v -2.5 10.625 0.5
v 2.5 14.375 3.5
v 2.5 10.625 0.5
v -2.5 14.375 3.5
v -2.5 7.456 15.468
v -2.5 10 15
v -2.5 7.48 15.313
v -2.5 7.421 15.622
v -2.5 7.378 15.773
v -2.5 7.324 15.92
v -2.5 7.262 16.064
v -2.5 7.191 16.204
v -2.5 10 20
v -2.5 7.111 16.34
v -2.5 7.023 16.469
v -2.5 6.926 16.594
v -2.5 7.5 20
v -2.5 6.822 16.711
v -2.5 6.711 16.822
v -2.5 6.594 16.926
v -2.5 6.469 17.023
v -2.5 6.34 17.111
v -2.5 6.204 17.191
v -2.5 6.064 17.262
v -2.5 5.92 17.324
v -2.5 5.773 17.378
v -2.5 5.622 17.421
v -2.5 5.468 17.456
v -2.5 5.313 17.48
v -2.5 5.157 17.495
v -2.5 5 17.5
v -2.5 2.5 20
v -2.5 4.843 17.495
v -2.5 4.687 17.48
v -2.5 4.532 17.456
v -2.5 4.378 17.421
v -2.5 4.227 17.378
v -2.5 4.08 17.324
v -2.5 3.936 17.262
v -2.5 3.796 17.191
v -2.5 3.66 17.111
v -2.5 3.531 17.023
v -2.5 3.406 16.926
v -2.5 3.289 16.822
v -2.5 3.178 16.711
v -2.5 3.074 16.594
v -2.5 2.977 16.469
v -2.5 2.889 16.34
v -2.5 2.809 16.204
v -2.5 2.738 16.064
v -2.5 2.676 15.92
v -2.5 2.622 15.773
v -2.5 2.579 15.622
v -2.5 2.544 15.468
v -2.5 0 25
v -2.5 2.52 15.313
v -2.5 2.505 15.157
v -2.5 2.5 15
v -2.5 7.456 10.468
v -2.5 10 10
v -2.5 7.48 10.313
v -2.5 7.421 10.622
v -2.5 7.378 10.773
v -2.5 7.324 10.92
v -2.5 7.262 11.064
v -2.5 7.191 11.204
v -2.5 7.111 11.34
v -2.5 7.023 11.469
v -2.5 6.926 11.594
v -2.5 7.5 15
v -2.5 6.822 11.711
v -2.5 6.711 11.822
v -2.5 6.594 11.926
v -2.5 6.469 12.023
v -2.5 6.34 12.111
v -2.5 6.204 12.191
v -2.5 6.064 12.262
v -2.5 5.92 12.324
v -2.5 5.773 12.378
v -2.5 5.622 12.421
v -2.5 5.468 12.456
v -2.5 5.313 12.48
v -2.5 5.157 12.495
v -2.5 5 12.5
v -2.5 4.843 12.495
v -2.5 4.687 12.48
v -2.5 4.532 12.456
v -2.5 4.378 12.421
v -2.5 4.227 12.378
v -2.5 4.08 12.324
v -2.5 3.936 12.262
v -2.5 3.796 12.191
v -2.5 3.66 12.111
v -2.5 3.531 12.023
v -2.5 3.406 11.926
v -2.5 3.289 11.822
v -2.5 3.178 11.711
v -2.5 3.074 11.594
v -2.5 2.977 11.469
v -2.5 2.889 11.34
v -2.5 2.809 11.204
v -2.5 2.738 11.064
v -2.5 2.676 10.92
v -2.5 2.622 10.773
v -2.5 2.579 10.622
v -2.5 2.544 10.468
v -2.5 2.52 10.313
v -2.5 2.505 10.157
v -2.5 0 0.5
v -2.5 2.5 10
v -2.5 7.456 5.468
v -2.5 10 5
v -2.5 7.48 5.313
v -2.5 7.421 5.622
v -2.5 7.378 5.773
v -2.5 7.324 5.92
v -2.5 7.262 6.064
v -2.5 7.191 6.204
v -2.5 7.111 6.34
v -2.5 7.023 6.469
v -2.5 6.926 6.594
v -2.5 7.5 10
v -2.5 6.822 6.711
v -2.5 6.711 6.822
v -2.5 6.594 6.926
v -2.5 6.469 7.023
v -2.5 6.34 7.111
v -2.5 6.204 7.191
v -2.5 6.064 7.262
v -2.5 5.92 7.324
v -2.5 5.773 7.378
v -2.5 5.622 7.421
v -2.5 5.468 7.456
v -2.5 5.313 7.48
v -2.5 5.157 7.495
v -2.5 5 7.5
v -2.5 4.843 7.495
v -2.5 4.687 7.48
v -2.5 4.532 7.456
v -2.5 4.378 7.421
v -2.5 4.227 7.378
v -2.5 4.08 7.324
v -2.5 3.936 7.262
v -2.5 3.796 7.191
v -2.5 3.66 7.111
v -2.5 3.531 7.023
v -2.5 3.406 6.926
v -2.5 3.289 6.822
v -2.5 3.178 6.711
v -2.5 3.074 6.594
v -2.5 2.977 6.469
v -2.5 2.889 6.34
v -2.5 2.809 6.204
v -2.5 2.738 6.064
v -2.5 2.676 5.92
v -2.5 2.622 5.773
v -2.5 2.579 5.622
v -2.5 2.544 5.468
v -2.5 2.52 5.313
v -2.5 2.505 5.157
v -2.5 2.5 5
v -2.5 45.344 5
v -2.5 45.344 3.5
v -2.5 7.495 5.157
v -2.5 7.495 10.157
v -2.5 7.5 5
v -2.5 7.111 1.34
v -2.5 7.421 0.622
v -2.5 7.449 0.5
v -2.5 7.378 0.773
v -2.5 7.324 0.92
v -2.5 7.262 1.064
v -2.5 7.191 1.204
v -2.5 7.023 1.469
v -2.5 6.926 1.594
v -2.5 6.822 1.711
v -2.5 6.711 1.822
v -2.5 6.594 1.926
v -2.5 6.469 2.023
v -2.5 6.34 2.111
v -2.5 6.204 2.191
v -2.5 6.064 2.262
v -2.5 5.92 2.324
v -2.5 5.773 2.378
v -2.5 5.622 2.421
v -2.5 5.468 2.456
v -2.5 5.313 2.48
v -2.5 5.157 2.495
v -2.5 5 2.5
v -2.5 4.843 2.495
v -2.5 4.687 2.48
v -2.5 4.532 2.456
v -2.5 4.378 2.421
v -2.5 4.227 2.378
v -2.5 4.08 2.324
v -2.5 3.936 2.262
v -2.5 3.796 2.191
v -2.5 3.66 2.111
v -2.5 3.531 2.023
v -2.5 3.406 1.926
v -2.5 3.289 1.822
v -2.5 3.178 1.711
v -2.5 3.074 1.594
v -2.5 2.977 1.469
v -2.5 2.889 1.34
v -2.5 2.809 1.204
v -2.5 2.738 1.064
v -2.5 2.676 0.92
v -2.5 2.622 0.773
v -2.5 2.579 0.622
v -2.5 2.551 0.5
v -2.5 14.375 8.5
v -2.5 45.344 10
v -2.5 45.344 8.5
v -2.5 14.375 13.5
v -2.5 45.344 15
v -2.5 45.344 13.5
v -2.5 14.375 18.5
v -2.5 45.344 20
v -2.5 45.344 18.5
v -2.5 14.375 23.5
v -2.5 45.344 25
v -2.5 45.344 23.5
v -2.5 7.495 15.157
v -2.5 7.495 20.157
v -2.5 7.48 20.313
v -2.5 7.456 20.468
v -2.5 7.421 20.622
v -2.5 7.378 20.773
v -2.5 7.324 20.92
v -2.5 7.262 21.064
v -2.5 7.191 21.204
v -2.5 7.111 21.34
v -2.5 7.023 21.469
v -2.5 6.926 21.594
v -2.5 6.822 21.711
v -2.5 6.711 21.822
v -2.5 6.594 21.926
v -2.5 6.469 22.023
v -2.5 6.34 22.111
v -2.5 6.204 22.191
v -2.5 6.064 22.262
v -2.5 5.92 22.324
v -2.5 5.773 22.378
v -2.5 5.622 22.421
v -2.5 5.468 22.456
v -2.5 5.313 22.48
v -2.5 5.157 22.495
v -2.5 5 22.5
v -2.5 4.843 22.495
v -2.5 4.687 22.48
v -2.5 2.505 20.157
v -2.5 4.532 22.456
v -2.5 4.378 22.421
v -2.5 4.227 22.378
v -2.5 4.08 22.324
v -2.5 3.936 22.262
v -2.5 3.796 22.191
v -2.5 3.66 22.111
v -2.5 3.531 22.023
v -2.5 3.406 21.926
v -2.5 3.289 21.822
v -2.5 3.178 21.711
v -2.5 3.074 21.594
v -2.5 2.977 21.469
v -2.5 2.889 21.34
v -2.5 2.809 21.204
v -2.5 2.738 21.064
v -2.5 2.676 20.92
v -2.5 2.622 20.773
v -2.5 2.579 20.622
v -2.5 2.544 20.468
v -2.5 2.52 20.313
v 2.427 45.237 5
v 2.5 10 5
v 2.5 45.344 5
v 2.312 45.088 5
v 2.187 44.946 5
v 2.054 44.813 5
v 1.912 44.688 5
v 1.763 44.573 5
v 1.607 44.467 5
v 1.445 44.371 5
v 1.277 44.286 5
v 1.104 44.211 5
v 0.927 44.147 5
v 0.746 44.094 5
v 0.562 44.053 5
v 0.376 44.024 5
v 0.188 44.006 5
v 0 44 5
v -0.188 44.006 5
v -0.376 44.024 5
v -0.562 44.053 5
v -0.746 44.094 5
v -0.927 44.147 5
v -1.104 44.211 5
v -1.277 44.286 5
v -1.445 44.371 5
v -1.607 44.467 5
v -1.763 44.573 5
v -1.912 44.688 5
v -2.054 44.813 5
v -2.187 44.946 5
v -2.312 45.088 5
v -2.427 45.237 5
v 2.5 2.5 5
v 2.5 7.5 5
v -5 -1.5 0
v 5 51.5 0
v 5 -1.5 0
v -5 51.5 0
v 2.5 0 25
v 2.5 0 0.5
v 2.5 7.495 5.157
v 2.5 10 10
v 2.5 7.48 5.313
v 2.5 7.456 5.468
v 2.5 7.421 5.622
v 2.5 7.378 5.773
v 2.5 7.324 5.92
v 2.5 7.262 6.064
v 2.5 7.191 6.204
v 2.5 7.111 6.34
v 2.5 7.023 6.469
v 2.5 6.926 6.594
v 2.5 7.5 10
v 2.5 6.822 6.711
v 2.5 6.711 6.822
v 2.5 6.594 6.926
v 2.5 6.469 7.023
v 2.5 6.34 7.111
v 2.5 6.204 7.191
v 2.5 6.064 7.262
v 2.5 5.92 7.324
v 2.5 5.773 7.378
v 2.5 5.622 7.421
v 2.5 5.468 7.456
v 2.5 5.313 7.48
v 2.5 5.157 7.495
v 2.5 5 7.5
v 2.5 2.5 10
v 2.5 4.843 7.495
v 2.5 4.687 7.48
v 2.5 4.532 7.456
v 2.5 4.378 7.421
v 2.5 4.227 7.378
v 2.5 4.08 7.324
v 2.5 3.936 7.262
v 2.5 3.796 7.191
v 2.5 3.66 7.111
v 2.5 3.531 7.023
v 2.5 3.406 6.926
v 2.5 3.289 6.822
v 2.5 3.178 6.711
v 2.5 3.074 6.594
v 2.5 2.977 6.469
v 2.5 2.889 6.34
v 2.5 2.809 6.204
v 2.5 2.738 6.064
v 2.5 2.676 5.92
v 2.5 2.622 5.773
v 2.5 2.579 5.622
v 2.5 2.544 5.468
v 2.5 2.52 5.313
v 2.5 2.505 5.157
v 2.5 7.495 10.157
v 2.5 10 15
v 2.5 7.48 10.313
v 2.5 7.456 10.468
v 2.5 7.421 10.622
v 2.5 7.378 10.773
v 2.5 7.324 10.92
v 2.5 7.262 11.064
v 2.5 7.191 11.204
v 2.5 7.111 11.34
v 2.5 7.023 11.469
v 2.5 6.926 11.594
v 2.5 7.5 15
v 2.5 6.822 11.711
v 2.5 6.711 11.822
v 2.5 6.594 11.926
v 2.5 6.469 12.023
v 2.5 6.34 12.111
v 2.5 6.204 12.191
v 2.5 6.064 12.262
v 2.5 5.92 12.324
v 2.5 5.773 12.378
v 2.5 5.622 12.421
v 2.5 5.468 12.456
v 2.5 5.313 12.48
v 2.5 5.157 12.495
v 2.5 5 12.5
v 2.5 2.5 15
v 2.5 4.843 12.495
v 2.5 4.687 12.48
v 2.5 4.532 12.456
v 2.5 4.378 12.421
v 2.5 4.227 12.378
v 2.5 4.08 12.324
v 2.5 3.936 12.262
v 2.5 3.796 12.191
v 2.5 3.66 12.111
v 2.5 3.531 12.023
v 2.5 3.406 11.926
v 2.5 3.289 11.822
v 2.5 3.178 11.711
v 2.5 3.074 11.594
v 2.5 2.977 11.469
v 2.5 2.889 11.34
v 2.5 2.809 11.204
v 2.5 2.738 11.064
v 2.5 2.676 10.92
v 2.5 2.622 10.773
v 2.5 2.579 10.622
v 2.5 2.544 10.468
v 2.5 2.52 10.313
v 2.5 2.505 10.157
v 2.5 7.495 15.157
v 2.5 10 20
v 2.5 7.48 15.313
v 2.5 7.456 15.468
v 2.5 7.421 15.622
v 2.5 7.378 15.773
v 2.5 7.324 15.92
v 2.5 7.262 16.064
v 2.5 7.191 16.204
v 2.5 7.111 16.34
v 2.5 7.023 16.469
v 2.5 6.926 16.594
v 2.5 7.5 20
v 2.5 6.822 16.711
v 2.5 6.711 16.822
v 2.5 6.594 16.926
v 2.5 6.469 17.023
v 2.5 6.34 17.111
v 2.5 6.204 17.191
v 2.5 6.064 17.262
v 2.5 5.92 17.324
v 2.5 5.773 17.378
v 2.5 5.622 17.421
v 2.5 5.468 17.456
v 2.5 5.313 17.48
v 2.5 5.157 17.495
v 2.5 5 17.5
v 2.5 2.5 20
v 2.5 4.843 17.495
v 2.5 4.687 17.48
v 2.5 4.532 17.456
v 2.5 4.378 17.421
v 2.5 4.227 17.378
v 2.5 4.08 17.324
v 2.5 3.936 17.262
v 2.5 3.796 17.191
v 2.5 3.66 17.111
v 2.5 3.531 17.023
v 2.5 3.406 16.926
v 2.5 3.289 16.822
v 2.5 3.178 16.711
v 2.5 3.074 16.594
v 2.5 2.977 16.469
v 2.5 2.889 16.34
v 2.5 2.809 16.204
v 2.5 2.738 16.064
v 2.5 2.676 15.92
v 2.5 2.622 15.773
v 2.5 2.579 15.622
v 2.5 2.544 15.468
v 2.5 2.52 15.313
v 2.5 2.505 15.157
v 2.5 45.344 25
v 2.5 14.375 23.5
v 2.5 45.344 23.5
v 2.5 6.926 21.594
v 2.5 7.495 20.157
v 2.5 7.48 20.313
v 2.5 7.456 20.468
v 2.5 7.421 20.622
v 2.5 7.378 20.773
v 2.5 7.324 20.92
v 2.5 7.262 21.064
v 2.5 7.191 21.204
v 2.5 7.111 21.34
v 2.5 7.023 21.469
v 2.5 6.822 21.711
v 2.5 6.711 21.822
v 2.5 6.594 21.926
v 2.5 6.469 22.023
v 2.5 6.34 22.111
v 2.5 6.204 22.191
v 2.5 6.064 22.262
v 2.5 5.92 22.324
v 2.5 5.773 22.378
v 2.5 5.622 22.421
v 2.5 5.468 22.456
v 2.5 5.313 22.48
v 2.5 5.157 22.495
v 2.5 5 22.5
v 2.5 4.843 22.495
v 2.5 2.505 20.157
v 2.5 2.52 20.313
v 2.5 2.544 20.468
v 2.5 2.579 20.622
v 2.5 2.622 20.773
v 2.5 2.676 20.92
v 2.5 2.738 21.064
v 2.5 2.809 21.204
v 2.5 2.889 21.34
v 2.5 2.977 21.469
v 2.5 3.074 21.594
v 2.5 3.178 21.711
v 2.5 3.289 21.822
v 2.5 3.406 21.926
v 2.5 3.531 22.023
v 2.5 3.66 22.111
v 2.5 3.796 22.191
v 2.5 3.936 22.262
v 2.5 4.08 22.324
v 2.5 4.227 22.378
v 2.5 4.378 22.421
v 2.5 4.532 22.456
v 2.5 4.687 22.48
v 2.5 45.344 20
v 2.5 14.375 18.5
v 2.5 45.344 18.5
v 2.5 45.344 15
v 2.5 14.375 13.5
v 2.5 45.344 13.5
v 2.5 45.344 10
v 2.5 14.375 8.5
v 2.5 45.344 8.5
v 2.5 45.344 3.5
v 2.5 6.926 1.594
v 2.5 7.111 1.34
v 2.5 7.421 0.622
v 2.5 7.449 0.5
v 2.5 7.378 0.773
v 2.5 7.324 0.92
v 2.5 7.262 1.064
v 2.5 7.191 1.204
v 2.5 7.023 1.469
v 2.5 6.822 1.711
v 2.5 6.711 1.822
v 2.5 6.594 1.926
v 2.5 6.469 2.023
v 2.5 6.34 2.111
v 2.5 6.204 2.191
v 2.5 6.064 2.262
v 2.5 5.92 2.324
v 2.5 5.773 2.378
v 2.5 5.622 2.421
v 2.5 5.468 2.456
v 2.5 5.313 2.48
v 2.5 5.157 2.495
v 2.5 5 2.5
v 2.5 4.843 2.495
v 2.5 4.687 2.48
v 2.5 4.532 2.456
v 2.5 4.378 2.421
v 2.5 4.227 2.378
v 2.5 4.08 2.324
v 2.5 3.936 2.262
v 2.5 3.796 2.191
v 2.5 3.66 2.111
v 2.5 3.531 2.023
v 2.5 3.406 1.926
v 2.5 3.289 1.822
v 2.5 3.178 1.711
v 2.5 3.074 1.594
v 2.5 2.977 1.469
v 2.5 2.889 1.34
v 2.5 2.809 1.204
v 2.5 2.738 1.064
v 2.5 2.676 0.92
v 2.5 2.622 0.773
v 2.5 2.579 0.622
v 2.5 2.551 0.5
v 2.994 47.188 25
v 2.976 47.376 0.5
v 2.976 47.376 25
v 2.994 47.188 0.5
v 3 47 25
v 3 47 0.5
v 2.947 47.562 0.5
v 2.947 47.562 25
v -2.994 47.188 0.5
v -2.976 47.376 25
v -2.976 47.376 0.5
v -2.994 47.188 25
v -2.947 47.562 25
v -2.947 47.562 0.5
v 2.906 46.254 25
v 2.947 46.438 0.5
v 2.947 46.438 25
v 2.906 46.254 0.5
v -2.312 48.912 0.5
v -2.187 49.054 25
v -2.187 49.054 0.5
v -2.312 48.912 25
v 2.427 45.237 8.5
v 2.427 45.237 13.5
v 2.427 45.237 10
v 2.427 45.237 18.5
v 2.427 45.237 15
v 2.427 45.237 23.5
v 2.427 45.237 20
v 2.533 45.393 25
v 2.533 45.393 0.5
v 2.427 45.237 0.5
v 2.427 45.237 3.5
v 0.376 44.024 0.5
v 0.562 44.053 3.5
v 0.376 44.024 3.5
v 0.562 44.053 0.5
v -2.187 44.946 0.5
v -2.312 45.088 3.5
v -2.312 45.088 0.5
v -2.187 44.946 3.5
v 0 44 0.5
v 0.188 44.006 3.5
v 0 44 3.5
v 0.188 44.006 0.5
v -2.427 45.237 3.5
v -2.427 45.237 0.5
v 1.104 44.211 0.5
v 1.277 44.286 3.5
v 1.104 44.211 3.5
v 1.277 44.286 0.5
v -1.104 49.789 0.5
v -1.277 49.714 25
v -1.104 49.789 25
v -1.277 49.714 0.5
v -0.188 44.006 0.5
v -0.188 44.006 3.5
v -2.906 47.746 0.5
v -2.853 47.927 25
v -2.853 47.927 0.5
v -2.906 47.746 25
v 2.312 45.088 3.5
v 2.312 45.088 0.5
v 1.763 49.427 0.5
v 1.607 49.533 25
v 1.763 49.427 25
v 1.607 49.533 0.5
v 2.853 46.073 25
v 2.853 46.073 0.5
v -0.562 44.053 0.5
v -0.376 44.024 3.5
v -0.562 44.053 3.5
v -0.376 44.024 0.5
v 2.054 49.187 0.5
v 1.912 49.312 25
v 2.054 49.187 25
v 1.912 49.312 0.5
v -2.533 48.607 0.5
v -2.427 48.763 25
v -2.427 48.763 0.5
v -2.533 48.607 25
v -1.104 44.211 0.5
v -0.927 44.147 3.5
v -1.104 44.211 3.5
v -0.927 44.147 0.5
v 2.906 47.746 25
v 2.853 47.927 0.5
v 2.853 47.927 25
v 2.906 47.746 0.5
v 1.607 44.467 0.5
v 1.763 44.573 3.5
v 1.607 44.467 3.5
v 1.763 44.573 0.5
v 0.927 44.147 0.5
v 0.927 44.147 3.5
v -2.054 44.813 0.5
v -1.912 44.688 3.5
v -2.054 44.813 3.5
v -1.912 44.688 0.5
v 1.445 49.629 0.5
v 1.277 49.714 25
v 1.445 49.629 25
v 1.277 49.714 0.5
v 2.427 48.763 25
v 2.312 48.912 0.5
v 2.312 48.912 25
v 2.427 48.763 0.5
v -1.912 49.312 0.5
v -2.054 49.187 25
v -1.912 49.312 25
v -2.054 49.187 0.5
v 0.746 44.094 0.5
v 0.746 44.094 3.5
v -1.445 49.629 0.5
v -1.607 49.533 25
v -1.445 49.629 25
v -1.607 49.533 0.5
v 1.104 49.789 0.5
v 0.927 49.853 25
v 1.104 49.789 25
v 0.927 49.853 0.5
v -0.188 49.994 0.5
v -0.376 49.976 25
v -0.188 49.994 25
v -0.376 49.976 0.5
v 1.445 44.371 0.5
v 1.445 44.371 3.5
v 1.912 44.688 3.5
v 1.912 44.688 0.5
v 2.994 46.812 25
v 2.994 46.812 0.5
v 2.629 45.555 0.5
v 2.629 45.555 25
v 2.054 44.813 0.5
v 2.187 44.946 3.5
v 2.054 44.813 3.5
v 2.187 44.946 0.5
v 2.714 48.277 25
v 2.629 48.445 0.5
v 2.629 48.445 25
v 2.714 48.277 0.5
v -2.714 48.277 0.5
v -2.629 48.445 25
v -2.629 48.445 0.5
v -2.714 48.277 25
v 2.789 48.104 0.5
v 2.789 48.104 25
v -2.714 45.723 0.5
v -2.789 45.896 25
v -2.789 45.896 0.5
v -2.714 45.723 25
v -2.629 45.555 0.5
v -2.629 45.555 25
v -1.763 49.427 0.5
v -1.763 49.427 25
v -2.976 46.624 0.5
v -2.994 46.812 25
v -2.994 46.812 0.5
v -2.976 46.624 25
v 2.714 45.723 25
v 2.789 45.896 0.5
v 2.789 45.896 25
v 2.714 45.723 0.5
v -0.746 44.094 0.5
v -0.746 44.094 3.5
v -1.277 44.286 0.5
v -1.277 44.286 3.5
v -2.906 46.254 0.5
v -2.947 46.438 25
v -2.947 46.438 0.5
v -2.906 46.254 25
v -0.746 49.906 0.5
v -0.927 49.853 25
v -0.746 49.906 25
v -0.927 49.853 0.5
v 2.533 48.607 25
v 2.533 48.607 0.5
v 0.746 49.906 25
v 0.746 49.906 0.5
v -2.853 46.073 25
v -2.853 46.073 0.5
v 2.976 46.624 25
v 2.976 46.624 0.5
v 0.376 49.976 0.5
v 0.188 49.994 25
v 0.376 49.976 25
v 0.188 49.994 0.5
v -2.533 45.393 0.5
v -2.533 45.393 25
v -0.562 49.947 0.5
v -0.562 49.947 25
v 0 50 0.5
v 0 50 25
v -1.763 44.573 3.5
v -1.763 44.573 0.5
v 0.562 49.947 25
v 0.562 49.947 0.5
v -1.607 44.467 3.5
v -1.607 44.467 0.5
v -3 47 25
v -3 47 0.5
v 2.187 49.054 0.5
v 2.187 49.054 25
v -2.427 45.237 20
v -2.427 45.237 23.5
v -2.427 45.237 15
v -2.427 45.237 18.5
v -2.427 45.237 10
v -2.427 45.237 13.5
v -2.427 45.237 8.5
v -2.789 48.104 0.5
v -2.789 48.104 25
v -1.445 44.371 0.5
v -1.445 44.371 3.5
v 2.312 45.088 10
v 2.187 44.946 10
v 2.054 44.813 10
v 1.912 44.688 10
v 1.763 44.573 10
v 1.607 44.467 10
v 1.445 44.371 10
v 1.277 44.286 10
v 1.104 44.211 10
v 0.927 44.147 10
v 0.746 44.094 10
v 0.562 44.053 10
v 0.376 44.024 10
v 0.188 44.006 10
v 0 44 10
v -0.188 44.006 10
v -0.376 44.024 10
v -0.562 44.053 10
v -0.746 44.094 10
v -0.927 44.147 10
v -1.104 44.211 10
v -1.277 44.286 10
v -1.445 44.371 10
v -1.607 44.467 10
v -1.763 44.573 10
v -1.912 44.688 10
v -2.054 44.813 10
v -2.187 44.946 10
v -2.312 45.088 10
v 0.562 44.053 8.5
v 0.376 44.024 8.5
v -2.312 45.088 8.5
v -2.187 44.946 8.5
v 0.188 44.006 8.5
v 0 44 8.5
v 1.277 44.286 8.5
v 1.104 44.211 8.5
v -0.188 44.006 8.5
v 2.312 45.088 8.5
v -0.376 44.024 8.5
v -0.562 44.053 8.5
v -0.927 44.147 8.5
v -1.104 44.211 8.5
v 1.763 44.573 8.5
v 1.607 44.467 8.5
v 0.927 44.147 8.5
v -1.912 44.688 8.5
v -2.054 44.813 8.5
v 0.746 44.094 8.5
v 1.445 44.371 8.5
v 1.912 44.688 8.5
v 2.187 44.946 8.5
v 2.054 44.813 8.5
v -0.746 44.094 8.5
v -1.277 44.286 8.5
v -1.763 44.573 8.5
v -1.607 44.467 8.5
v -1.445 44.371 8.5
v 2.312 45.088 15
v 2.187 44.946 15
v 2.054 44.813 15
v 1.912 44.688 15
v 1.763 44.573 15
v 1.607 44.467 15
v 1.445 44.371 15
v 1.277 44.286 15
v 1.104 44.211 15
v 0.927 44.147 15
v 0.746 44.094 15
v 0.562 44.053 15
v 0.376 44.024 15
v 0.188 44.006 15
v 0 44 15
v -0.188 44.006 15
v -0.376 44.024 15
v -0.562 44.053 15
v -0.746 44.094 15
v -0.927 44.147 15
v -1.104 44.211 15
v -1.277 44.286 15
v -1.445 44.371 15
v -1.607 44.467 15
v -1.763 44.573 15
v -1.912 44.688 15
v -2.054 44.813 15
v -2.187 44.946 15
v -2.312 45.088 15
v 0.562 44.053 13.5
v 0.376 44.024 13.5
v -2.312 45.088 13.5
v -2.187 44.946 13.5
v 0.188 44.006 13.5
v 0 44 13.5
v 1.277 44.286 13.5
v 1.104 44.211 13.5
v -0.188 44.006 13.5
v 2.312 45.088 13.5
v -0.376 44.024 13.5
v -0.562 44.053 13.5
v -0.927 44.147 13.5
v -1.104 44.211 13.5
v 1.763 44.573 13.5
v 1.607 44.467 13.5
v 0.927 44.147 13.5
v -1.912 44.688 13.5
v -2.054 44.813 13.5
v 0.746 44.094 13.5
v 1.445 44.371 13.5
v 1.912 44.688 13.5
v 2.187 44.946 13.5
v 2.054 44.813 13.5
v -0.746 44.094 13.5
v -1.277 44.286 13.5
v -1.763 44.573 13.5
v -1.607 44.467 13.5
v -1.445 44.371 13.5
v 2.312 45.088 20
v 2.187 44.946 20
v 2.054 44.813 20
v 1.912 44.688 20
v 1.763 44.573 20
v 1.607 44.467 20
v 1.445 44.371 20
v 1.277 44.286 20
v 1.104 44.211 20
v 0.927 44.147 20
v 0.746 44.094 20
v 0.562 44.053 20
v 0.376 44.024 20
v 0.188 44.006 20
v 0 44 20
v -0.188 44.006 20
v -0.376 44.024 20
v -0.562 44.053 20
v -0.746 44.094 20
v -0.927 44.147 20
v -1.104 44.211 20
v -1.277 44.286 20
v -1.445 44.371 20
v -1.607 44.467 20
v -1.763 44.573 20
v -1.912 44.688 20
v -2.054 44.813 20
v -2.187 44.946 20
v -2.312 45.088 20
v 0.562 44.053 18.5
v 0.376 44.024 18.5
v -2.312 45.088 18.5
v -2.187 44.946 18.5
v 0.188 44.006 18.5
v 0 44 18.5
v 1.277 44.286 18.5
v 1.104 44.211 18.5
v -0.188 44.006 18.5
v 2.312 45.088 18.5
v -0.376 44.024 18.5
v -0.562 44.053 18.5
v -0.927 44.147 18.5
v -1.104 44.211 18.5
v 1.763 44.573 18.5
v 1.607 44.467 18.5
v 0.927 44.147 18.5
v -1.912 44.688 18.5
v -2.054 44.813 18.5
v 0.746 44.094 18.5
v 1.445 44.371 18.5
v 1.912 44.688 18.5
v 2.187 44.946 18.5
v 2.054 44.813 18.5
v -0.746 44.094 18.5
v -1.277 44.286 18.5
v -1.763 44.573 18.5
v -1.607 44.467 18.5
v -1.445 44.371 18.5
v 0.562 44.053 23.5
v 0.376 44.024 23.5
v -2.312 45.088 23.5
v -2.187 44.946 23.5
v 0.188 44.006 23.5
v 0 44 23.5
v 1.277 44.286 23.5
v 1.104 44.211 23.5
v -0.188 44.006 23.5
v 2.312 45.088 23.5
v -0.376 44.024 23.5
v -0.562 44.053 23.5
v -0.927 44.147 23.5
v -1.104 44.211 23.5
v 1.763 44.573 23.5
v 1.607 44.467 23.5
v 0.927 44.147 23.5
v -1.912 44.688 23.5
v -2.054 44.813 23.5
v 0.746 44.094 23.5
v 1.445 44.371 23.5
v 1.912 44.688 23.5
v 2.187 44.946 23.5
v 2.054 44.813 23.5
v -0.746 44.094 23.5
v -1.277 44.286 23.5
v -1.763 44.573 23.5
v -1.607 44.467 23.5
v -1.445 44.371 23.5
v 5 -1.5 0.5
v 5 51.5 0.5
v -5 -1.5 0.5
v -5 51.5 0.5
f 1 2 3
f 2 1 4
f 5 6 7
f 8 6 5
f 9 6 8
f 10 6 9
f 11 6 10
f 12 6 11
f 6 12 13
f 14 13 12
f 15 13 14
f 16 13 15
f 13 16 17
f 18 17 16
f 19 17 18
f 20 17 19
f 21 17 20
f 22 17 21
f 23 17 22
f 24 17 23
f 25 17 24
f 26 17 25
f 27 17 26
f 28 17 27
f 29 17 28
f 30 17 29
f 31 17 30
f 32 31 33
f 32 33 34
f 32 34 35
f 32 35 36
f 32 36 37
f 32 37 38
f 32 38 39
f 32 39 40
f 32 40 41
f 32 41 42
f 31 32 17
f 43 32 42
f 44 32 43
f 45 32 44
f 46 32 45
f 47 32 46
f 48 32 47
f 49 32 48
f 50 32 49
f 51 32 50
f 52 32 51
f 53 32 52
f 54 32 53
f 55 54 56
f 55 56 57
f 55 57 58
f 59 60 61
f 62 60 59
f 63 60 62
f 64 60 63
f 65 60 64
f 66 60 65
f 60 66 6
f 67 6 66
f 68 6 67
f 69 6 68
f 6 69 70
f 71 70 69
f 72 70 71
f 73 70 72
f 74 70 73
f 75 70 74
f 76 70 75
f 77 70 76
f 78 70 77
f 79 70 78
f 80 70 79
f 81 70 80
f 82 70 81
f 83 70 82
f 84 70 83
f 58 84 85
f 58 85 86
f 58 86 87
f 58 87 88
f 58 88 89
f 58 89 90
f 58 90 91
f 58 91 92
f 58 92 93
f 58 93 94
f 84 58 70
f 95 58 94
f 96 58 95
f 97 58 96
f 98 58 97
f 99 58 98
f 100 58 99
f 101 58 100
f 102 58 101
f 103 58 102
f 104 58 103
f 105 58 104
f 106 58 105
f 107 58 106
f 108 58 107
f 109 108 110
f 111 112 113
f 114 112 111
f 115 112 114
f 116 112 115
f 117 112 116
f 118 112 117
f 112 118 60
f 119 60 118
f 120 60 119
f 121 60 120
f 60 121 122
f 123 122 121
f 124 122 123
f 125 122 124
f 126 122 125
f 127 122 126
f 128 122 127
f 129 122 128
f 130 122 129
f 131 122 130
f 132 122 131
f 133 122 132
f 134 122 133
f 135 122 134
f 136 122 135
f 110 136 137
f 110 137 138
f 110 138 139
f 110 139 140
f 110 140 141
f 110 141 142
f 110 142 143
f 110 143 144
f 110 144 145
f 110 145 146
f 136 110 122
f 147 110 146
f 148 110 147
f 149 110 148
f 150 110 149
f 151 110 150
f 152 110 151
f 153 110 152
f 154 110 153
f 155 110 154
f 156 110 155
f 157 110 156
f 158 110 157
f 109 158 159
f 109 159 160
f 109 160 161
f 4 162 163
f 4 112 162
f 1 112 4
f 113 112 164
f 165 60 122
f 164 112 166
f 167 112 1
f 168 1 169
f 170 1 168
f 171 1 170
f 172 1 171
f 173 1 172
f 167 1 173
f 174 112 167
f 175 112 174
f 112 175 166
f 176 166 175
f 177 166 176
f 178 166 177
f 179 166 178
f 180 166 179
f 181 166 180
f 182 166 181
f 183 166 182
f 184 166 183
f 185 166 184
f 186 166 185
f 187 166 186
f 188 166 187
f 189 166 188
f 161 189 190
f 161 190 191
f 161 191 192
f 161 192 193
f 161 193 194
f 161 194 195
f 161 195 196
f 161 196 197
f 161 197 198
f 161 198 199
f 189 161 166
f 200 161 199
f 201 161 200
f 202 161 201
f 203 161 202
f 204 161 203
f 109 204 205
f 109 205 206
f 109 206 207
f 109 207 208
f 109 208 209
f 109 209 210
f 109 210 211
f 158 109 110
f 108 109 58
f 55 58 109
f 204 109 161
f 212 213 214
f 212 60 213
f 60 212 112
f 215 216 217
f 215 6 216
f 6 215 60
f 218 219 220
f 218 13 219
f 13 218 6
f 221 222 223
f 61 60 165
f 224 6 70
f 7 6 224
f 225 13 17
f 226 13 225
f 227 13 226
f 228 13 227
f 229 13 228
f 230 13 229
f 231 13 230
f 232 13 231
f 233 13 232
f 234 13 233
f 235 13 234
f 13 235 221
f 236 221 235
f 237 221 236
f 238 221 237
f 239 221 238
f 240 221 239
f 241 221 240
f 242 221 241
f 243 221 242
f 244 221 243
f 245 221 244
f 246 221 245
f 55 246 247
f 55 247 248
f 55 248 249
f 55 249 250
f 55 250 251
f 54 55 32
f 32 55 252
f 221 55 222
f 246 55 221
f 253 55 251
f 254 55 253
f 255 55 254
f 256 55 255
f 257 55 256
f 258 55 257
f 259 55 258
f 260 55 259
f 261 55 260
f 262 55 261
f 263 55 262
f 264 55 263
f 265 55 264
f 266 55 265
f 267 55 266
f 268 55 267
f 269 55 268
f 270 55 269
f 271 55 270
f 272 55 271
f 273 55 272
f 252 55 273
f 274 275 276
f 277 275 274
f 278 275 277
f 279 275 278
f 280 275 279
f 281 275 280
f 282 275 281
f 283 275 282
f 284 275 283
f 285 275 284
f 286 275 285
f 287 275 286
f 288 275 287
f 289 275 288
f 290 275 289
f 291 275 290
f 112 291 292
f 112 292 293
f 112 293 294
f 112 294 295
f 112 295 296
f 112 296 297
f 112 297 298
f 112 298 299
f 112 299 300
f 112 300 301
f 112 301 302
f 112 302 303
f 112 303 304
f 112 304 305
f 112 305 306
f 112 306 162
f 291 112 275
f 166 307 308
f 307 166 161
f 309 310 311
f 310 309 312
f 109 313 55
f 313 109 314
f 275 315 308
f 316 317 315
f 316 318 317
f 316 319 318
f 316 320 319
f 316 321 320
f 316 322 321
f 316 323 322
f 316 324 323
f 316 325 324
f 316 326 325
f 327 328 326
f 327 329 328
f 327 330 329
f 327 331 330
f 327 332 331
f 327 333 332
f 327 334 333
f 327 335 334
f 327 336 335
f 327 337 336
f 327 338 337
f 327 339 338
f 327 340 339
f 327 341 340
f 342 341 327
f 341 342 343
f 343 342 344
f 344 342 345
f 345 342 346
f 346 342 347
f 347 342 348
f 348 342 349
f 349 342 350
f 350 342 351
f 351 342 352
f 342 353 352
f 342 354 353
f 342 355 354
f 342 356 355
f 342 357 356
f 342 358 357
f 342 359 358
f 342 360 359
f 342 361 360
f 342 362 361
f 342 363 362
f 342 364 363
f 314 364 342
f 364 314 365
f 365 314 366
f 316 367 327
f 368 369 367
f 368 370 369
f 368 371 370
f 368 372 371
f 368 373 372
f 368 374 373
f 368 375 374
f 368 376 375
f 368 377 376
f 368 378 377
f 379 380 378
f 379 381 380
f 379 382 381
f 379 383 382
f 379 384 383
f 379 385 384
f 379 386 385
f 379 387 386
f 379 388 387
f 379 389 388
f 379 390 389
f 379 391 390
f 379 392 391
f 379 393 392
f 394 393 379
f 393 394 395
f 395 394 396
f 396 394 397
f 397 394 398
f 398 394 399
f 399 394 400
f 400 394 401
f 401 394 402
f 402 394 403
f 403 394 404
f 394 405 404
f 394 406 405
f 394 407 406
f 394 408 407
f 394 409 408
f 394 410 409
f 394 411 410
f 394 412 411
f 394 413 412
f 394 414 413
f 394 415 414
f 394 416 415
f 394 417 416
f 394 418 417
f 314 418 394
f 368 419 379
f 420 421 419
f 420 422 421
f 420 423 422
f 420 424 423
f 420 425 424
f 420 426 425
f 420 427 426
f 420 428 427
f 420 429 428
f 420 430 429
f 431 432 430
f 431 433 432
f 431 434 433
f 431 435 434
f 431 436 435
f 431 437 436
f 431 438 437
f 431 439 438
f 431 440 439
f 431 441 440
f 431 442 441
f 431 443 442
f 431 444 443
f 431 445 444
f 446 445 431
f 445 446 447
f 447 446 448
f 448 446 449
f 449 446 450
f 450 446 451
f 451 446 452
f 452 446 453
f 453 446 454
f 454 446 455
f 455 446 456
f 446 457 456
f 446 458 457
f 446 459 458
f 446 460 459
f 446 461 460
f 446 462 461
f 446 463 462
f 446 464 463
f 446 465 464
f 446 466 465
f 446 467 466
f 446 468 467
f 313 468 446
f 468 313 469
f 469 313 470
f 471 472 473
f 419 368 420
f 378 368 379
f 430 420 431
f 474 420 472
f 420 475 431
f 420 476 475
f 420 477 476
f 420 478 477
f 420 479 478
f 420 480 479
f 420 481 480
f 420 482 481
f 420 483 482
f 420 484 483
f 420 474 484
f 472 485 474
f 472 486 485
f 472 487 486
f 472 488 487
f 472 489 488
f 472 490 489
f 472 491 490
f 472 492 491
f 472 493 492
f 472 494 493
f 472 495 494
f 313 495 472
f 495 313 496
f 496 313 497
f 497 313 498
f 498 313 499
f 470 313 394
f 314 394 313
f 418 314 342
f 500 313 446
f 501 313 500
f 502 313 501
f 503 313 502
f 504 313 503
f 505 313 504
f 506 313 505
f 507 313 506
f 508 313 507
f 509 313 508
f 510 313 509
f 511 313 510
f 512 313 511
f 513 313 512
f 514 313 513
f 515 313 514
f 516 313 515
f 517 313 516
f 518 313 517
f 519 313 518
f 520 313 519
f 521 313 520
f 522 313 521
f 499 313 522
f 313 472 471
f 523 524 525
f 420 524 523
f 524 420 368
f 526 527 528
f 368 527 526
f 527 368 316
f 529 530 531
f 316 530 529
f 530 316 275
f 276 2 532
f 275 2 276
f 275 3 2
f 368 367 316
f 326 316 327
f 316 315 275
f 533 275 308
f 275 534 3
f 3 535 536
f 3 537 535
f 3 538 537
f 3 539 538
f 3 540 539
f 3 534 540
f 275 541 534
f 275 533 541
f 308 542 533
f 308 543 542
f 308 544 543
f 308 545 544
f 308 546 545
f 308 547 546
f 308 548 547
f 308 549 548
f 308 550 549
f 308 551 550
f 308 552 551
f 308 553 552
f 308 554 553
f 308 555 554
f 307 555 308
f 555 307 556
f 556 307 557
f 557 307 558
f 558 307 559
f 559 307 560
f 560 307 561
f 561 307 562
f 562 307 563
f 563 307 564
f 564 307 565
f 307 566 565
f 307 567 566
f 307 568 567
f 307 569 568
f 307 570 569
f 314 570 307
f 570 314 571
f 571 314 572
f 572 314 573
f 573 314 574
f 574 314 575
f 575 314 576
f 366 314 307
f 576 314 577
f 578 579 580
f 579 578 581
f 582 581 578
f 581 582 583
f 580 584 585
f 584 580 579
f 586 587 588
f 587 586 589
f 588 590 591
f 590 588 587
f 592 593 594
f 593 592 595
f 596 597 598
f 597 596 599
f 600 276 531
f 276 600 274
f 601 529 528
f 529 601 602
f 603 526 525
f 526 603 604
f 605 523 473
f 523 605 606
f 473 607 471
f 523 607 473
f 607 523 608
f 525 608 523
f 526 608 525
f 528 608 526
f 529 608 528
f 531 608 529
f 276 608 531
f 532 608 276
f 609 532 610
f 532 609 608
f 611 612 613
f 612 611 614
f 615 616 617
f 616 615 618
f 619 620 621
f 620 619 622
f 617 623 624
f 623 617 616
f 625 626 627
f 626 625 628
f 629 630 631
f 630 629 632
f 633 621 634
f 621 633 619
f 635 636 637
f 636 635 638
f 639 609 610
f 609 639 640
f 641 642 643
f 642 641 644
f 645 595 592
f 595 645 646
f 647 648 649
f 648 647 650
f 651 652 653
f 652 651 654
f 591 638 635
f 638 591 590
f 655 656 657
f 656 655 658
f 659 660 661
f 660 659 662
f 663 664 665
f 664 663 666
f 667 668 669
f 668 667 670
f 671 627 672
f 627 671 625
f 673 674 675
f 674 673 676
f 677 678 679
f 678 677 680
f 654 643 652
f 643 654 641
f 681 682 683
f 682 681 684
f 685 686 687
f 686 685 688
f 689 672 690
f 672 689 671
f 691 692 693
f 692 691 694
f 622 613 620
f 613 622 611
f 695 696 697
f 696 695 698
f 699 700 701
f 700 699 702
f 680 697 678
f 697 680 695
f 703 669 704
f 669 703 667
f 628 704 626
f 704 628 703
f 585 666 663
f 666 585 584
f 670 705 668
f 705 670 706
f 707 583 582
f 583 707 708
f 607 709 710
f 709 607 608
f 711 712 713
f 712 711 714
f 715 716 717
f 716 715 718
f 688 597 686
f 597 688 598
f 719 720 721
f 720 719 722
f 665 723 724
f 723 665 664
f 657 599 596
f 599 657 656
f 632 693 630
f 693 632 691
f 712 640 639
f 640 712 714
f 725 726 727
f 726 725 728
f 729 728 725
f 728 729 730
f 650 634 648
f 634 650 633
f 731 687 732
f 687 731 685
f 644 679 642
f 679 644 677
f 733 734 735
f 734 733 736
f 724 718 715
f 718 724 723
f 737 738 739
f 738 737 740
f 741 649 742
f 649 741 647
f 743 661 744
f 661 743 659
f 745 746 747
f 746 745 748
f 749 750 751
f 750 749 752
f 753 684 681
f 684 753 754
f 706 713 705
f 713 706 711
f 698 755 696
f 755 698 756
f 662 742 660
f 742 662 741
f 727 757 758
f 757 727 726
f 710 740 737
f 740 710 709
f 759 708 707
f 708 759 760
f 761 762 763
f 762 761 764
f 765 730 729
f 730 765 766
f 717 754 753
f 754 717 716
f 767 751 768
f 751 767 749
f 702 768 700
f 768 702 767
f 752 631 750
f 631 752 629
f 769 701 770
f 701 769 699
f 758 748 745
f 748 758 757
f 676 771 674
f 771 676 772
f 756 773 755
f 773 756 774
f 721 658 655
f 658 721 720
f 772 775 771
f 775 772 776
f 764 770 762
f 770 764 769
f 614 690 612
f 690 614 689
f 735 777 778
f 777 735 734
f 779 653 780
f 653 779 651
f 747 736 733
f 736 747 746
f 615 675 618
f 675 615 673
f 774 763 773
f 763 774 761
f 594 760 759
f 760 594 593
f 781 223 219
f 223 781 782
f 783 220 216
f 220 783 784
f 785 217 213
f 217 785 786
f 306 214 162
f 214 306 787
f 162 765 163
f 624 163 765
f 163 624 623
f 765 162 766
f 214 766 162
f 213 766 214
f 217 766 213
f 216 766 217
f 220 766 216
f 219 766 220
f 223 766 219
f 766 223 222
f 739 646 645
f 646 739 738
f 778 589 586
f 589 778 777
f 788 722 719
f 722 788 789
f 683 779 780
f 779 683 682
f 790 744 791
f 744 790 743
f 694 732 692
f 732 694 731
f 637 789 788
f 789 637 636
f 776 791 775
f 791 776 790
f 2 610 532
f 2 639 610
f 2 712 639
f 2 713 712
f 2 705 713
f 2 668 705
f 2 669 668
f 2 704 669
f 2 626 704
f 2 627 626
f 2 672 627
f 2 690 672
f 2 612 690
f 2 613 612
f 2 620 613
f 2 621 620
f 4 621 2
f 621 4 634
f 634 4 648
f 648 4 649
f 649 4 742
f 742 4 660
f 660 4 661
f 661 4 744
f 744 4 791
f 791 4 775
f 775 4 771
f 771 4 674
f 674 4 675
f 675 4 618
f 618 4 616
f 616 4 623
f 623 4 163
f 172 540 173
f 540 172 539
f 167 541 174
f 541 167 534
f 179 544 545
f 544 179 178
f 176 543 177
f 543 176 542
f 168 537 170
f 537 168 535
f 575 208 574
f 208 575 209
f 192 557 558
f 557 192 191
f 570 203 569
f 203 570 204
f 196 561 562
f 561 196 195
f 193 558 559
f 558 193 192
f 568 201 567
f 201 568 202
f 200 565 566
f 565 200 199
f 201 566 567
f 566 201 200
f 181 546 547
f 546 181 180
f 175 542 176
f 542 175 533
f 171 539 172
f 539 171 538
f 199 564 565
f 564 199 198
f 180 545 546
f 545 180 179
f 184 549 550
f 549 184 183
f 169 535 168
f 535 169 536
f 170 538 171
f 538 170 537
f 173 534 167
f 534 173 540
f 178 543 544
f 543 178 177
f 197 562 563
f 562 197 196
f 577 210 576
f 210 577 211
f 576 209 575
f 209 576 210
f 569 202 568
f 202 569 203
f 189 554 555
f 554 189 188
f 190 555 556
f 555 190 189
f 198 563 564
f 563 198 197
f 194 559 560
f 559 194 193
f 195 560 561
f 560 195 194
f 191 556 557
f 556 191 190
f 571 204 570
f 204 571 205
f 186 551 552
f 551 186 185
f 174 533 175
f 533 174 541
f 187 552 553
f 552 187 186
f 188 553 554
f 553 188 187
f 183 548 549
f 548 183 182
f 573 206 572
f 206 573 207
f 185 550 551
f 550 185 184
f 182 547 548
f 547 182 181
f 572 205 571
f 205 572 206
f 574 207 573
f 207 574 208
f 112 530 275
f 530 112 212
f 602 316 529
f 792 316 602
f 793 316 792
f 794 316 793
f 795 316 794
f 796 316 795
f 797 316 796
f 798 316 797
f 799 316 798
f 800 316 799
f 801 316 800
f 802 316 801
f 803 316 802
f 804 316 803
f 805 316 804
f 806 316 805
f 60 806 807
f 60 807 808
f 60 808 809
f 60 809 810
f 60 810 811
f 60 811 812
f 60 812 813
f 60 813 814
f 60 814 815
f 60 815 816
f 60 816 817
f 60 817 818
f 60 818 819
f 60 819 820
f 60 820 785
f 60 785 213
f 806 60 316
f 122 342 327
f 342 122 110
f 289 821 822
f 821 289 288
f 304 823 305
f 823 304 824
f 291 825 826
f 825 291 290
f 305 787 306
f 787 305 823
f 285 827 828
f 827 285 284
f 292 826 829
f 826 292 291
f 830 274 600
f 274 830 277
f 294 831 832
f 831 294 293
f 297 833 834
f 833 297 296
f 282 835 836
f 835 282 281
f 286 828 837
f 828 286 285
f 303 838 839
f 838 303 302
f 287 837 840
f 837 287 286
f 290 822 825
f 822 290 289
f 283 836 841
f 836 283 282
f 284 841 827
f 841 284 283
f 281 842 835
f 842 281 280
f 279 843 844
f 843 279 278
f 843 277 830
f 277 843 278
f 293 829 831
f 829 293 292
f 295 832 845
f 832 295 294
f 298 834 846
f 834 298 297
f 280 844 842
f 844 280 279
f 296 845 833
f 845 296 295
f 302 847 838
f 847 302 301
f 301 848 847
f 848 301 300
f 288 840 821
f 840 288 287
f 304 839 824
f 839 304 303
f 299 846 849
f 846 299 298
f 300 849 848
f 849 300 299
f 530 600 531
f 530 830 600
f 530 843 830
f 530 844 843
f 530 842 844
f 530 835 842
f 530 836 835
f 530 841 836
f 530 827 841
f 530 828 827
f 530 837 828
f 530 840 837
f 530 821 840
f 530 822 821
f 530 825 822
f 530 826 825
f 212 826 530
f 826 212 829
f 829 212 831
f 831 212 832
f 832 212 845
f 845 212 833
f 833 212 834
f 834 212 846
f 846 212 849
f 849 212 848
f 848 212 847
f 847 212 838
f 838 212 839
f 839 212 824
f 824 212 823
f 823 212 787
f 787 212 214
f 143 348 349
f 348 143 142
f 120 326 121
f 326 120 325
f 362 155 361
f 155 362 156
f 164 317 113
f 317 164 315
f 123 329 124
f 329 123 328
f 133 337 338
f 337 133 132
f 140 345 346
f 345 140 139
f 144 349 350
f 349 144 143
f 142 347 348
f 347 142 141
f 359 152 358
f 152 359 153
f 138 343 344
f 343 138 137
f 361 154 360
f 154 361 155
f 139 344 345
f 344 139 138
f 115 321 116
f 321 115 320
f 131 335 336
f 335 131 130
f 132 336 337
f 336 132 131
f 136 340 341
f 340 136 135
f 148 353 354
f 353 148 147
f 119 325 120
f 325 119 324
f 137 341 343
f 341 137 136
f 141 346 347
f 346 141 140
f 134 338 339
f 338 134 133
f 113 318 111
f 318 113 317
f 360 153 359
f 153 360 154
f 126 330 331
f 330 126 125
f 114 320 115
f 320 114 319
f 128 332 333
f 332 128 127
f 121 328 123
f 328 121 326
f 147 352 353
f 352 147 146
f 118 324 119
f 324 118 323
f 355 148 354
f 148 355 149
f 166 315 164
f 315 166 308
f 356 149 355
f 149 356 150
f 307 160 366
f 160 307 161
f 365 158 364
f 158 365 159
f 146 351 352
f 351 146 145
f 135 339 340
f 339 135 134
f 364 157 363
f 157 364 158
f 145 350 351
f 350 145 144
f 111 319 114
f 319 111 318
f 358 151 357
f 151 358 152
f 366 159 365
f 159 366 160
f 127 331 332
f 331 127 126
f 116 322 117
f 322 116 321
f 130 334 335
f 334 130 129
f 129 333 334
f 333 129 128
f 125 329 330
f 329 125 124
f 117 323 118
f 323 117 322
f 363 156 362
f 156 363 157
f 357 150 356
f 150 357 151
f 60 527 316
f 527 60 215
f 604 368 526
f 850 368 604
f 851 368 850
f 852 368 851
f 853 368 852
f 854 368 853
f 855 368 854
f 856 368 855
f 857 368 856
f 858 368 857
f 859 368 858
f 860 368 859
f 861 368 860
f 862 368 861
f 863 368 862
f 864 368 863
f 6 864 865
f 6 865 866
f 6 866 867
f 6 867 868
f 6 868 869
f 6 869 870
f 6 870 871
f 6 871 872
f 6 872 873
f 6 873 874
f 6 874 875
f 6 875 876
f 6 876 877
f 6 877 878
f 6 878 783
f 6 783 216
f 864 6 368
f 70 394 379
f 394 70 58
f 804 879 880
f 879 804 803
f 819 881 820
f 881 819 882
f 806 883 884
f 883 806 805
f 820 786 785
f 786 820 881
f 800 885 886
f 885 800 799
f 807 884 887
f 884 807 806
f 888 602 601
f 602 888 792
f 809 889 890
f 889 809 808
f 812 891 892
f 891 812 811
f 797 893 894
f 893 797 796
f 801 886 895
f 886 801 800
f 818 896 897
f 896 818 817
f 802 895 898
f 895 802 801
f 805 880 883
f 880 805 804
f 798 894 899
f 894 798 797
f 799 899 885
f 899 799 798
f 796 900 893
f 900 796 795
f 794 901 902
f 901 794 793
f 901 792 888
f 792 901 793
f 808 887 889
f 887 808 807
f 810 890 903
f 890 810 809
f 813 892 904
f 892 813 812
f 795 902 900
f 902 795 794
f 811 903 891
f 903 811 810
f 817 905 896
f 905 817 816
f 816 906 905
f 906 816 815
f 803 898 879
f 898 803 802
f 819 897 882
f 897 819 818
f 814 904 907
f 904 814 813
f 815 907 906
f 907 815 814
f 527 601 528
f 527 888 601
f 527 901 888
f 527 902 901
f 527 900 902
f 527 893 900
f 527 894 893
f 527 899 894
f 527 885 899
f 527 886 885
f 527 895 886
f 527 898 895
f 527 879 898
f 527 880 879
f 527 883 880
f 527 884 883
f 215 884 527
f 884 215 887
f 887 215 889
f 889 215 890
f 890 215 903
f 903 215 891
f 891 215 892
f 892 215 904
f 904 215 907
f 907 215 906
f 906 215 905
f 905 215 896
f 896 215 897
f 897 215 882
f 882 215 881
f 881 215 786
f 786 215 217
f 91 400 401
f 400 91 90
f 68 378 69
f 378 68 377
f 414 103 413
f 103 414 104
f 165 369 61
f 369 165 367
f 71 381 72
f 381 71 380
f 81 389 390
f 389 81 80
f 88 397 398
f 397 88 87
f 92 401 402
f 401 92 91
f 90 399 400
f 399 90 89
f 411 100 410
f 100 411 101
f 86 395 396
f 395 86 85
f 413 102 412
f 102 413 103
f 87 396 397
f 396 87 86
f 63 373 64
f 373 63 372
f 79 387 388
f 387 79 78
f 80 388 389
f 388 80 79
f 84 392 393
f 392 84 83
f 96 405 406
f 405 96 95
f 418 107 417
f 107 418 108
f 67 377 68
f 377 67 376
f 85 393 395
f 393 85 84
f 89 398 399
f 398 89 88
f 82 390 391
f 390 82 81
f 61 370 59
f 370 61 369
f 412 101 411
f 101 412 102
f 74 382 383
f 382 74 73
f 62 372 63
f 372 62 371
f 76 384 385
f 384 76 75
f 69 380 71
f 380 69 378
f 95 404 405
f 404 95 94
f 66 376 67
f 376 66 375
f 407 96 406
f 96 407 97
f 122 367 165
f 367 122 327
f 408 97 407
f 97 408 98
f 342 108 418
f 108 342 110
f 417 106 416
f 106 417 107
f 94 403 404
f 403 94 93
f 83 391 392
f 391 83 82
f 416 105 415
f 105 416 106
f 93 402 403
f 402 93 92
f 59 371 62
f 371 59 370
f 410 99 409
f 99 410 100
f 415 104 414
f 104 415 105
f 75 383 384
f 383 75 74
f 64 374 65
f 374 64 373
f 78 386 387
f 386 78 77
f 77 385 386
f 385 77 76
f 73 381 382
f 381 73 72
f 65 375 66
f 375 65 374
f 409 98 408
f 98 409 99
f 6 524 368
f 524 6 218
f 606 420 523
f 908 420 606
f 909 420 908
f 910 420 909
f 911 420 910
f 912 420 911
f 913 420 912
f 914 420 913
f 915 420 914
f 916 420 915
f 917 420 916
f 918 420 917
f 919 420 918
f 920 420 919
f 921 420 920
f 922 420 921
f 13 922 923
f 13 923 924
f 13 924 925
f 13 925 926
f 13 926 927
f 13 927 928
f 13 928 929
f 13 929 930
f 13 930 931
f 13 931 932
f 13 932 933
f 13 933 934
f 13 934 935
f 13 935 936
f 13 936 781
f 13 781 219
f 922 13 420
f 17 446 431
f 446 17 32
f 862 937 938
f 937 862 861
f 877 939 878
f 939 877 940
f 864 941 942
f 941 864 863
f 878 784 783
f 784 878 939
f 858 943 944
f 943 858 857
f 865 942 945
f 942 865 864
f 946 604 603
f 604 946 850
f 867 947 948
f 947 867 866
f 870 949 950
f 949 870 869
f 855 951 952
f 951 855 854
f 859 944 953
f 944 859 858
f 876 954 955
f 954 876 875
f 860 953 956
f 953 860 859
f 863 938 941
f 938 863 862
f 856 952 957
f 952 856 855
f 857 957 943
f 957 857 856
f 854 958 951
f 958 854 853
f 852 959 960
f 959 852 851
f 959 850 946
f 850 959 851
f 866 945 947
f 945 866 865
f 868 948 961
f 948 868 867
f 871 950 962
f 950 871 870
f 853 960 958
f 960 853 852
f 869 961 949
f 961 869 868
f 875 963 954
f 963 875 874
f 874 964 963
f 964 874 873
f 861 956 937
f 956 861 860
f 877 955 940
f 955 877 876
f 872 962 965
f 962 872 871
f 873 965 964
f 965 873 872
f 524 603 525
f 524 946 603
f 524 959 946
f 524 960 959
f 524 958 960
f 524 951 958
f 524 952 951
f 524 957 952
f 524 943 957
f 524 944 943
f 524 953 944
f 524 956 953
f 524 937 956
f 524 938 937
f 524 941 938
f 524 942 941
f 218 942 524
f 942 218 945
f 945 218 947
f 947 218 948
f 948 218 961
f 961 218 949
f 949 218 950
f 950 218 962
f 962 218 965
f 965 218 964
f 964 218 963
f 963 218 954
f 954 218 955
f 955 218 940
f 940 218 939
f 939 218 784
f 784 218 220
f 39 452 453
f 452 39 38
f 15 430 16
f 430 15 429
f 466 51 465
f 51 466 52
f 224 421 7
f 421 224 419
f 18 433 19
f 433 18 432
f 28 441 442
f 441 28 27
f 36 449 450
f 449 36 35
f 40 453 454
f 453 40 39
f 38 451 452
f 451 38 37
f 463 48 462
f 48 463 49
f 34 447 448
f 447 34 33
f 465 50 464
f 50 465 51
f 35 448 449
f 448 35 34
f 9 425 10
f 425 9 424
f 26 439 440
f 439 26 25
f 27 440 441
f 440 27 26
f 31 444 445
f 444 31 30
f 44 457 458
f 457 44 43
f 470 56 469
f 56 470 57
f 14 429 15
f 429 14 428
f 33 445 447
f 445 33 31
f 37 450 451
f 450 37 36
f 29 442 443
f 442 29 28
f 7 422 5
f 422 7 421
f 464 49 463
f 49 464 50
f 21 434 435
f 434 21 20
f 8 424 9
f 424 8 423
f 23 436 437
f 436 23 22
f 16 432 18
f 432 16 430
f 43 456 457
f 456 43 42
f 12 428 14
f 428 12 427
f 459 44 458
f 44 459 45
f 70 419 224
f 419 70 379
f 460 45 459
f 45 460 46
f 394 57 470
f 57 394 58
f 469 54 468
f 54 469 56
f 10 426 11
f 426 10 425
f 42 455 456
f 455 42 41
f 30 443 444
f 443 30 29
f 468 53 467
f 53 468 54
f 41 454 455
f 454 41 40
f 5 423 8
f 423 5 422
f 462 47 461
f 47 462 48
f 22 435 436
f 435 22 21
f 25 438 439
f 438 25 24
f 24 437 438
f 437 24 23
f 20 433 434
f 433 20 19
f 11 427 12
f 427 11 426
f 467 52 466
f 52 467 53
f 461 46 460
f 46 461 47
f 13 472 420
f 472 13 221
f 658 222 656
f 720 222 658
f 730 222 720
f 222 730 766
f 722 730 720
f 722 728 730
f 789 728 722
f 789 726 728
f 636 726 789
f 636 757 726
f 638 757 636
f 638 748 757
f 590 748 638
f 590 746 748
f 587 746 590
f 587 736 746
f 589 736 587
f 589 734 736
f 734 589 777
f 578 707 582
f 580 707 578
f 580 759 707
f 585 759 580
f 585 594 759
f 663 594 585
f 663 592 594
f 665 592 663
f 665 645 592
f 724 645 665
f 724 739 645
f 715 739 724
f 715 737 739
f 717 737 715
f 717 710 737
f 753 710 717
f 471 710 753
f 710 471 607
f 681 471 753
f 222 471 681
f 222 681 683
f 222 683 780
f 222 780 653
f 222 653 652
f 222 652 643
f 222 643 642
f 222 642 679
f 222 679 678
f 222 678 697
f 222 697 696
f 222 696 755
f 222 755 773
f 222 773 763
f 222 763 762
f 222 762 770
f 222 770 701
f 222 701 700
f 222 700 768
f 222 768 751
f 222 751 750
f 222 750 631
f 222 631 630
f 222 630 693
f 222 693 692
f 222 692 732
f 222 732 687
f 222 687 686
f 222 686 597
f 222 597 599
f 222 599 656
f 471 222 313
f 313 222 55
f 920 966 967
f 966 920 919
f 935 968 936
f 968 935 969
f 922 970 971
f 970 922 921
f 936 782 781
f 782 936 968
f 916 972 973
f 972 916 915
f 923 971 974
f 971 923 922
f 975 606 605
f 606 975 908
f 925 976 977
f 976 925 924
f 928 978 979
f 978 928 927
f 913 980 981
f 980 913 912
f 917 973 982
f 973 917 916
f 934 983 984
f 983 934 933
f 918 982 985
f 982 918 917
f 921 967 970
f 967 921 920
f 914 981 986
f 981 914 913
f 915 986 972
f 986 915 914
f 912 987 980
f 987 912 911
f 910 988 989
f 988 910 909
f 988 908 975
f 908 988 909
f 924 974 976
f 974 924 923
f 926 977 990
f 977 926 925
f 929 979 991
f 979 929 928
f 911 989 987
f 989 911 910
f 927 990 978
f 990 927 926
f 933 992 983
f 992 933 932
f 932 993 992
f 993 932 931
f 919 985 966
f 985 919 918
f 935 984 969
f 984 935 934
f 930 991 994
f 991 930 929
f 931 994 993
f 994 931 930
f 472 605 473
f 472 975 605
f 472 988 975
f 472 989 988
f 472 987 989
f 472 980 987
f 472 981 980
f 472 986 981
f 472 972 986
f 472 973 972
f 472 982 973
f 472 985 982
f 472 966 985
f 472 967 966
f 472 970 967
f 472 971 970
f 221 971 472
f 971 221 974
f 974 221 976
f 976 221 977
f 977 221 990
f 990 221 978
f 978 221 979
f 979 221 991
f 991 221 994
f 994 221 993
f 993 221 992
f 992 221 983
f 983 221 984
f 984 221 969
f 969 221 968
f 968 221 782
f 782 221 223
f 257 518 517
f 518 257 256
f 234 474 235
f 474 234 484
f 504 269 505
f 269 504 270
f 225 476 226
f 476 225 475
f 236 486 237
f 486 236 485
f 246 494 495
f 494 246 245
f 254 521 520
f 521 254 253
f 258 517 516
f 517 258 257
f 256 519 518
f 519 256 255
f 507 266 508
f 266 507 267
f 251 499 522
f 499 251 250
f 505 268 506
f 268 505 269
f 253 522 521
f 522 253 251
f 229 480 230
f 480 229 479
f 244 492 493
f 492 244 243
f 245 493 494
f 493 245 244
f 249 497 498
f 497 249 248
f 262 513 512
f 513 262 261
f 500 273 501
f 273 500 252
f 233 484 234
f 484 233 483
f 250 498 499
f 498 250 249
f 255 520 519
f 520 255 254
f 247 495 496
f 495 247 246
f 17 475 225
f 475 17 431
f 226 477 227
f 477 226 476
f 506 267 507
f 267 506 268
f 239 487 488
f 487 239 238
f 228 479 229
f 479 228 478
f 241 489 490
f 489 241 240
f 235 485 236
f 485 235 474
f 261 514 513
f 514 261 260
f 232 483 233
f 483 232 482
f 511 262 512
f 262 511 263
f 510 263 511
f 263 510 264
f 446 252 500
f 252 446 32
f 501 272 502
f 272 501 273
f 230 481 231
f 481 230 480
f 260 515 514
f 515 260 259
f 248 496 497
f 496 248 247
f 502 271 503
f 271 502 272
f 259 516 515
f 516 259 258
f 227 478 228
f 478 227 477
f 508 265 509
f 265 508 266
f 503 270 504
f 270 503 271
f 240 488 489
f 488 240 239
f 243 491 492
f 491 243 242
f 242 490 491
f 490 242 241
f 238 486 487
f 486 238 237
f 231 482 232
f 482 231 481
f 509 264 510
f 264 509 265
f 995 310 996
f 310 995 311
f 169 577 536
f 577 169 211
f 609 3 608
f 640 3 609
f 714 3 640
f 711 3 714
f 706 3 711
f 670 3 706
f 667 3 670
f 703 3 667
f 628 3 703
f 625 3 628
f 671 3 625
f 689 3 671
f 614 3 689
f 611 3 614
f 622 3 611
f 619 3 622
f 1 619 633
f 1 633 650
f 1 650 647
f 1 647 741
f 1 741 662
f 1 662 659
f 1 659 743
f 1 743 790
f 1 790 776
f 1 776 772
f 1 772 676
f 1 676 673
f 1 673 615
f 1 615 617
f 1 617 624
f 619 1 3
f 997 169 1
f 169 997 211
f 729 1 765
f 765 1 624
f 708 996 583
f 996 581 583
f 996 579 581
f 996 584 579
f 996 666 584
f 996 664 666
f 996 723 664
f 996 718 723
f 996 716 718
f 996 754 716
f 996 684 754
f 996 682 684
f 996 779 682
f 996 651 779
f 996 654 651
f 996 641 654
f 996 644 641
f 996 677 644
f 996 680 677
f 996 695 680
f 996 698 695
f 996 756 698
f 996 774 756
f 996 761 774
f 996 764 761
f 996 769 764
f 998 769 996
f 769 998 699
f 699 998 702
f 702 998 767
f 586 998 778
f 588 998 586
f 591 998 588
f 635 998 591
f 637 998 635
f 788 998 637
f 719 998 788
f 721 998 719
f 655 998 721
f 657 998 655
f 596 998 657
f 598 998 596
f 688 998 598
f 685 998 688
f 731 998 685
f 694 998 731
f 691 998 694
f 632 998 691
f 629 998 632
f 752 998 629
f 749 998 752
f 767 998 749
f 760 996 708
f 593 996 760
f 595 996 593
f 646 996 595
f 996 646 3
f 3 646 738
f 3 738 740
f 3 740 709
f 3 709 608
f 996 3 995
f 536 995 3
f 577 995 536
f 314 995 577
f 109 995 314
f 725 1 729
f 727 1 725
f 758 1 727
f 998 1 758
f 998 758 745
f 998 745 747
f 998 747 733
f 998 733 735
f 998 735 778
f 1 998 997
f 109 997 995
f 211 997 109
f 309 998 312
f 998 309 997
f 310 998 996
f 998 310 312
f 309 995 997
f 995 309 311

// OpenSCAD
$fn=100;

ht=5;
l=50;
w=5;
d1=6; // cylinder
d2=5; // hole

translate([-5,-d1/4,0])
cube([10,l+d1/2,.5]);

for(i=[0:2:8]){
    j=ht*(i/2);
    difference(){
        union(){
            hull(){
                translate([-w/2,0,j])
                cube([w,ht*2,ht]);
                translate([-w/2,0,j+ht-1])
                cube([w,15,1]);
            }
            translate([0,l-d1/2,j])
            cylinder(d=d1,h=ht);

            translate([-w/2,0,j+ht-1.5])
            cube([w,l-d1/2,1.5]);
        }
        
        translate([-w,5,j])
        rotate([0,90,0])
        cylinder(d=d2,h=w*2);
    }    
}
